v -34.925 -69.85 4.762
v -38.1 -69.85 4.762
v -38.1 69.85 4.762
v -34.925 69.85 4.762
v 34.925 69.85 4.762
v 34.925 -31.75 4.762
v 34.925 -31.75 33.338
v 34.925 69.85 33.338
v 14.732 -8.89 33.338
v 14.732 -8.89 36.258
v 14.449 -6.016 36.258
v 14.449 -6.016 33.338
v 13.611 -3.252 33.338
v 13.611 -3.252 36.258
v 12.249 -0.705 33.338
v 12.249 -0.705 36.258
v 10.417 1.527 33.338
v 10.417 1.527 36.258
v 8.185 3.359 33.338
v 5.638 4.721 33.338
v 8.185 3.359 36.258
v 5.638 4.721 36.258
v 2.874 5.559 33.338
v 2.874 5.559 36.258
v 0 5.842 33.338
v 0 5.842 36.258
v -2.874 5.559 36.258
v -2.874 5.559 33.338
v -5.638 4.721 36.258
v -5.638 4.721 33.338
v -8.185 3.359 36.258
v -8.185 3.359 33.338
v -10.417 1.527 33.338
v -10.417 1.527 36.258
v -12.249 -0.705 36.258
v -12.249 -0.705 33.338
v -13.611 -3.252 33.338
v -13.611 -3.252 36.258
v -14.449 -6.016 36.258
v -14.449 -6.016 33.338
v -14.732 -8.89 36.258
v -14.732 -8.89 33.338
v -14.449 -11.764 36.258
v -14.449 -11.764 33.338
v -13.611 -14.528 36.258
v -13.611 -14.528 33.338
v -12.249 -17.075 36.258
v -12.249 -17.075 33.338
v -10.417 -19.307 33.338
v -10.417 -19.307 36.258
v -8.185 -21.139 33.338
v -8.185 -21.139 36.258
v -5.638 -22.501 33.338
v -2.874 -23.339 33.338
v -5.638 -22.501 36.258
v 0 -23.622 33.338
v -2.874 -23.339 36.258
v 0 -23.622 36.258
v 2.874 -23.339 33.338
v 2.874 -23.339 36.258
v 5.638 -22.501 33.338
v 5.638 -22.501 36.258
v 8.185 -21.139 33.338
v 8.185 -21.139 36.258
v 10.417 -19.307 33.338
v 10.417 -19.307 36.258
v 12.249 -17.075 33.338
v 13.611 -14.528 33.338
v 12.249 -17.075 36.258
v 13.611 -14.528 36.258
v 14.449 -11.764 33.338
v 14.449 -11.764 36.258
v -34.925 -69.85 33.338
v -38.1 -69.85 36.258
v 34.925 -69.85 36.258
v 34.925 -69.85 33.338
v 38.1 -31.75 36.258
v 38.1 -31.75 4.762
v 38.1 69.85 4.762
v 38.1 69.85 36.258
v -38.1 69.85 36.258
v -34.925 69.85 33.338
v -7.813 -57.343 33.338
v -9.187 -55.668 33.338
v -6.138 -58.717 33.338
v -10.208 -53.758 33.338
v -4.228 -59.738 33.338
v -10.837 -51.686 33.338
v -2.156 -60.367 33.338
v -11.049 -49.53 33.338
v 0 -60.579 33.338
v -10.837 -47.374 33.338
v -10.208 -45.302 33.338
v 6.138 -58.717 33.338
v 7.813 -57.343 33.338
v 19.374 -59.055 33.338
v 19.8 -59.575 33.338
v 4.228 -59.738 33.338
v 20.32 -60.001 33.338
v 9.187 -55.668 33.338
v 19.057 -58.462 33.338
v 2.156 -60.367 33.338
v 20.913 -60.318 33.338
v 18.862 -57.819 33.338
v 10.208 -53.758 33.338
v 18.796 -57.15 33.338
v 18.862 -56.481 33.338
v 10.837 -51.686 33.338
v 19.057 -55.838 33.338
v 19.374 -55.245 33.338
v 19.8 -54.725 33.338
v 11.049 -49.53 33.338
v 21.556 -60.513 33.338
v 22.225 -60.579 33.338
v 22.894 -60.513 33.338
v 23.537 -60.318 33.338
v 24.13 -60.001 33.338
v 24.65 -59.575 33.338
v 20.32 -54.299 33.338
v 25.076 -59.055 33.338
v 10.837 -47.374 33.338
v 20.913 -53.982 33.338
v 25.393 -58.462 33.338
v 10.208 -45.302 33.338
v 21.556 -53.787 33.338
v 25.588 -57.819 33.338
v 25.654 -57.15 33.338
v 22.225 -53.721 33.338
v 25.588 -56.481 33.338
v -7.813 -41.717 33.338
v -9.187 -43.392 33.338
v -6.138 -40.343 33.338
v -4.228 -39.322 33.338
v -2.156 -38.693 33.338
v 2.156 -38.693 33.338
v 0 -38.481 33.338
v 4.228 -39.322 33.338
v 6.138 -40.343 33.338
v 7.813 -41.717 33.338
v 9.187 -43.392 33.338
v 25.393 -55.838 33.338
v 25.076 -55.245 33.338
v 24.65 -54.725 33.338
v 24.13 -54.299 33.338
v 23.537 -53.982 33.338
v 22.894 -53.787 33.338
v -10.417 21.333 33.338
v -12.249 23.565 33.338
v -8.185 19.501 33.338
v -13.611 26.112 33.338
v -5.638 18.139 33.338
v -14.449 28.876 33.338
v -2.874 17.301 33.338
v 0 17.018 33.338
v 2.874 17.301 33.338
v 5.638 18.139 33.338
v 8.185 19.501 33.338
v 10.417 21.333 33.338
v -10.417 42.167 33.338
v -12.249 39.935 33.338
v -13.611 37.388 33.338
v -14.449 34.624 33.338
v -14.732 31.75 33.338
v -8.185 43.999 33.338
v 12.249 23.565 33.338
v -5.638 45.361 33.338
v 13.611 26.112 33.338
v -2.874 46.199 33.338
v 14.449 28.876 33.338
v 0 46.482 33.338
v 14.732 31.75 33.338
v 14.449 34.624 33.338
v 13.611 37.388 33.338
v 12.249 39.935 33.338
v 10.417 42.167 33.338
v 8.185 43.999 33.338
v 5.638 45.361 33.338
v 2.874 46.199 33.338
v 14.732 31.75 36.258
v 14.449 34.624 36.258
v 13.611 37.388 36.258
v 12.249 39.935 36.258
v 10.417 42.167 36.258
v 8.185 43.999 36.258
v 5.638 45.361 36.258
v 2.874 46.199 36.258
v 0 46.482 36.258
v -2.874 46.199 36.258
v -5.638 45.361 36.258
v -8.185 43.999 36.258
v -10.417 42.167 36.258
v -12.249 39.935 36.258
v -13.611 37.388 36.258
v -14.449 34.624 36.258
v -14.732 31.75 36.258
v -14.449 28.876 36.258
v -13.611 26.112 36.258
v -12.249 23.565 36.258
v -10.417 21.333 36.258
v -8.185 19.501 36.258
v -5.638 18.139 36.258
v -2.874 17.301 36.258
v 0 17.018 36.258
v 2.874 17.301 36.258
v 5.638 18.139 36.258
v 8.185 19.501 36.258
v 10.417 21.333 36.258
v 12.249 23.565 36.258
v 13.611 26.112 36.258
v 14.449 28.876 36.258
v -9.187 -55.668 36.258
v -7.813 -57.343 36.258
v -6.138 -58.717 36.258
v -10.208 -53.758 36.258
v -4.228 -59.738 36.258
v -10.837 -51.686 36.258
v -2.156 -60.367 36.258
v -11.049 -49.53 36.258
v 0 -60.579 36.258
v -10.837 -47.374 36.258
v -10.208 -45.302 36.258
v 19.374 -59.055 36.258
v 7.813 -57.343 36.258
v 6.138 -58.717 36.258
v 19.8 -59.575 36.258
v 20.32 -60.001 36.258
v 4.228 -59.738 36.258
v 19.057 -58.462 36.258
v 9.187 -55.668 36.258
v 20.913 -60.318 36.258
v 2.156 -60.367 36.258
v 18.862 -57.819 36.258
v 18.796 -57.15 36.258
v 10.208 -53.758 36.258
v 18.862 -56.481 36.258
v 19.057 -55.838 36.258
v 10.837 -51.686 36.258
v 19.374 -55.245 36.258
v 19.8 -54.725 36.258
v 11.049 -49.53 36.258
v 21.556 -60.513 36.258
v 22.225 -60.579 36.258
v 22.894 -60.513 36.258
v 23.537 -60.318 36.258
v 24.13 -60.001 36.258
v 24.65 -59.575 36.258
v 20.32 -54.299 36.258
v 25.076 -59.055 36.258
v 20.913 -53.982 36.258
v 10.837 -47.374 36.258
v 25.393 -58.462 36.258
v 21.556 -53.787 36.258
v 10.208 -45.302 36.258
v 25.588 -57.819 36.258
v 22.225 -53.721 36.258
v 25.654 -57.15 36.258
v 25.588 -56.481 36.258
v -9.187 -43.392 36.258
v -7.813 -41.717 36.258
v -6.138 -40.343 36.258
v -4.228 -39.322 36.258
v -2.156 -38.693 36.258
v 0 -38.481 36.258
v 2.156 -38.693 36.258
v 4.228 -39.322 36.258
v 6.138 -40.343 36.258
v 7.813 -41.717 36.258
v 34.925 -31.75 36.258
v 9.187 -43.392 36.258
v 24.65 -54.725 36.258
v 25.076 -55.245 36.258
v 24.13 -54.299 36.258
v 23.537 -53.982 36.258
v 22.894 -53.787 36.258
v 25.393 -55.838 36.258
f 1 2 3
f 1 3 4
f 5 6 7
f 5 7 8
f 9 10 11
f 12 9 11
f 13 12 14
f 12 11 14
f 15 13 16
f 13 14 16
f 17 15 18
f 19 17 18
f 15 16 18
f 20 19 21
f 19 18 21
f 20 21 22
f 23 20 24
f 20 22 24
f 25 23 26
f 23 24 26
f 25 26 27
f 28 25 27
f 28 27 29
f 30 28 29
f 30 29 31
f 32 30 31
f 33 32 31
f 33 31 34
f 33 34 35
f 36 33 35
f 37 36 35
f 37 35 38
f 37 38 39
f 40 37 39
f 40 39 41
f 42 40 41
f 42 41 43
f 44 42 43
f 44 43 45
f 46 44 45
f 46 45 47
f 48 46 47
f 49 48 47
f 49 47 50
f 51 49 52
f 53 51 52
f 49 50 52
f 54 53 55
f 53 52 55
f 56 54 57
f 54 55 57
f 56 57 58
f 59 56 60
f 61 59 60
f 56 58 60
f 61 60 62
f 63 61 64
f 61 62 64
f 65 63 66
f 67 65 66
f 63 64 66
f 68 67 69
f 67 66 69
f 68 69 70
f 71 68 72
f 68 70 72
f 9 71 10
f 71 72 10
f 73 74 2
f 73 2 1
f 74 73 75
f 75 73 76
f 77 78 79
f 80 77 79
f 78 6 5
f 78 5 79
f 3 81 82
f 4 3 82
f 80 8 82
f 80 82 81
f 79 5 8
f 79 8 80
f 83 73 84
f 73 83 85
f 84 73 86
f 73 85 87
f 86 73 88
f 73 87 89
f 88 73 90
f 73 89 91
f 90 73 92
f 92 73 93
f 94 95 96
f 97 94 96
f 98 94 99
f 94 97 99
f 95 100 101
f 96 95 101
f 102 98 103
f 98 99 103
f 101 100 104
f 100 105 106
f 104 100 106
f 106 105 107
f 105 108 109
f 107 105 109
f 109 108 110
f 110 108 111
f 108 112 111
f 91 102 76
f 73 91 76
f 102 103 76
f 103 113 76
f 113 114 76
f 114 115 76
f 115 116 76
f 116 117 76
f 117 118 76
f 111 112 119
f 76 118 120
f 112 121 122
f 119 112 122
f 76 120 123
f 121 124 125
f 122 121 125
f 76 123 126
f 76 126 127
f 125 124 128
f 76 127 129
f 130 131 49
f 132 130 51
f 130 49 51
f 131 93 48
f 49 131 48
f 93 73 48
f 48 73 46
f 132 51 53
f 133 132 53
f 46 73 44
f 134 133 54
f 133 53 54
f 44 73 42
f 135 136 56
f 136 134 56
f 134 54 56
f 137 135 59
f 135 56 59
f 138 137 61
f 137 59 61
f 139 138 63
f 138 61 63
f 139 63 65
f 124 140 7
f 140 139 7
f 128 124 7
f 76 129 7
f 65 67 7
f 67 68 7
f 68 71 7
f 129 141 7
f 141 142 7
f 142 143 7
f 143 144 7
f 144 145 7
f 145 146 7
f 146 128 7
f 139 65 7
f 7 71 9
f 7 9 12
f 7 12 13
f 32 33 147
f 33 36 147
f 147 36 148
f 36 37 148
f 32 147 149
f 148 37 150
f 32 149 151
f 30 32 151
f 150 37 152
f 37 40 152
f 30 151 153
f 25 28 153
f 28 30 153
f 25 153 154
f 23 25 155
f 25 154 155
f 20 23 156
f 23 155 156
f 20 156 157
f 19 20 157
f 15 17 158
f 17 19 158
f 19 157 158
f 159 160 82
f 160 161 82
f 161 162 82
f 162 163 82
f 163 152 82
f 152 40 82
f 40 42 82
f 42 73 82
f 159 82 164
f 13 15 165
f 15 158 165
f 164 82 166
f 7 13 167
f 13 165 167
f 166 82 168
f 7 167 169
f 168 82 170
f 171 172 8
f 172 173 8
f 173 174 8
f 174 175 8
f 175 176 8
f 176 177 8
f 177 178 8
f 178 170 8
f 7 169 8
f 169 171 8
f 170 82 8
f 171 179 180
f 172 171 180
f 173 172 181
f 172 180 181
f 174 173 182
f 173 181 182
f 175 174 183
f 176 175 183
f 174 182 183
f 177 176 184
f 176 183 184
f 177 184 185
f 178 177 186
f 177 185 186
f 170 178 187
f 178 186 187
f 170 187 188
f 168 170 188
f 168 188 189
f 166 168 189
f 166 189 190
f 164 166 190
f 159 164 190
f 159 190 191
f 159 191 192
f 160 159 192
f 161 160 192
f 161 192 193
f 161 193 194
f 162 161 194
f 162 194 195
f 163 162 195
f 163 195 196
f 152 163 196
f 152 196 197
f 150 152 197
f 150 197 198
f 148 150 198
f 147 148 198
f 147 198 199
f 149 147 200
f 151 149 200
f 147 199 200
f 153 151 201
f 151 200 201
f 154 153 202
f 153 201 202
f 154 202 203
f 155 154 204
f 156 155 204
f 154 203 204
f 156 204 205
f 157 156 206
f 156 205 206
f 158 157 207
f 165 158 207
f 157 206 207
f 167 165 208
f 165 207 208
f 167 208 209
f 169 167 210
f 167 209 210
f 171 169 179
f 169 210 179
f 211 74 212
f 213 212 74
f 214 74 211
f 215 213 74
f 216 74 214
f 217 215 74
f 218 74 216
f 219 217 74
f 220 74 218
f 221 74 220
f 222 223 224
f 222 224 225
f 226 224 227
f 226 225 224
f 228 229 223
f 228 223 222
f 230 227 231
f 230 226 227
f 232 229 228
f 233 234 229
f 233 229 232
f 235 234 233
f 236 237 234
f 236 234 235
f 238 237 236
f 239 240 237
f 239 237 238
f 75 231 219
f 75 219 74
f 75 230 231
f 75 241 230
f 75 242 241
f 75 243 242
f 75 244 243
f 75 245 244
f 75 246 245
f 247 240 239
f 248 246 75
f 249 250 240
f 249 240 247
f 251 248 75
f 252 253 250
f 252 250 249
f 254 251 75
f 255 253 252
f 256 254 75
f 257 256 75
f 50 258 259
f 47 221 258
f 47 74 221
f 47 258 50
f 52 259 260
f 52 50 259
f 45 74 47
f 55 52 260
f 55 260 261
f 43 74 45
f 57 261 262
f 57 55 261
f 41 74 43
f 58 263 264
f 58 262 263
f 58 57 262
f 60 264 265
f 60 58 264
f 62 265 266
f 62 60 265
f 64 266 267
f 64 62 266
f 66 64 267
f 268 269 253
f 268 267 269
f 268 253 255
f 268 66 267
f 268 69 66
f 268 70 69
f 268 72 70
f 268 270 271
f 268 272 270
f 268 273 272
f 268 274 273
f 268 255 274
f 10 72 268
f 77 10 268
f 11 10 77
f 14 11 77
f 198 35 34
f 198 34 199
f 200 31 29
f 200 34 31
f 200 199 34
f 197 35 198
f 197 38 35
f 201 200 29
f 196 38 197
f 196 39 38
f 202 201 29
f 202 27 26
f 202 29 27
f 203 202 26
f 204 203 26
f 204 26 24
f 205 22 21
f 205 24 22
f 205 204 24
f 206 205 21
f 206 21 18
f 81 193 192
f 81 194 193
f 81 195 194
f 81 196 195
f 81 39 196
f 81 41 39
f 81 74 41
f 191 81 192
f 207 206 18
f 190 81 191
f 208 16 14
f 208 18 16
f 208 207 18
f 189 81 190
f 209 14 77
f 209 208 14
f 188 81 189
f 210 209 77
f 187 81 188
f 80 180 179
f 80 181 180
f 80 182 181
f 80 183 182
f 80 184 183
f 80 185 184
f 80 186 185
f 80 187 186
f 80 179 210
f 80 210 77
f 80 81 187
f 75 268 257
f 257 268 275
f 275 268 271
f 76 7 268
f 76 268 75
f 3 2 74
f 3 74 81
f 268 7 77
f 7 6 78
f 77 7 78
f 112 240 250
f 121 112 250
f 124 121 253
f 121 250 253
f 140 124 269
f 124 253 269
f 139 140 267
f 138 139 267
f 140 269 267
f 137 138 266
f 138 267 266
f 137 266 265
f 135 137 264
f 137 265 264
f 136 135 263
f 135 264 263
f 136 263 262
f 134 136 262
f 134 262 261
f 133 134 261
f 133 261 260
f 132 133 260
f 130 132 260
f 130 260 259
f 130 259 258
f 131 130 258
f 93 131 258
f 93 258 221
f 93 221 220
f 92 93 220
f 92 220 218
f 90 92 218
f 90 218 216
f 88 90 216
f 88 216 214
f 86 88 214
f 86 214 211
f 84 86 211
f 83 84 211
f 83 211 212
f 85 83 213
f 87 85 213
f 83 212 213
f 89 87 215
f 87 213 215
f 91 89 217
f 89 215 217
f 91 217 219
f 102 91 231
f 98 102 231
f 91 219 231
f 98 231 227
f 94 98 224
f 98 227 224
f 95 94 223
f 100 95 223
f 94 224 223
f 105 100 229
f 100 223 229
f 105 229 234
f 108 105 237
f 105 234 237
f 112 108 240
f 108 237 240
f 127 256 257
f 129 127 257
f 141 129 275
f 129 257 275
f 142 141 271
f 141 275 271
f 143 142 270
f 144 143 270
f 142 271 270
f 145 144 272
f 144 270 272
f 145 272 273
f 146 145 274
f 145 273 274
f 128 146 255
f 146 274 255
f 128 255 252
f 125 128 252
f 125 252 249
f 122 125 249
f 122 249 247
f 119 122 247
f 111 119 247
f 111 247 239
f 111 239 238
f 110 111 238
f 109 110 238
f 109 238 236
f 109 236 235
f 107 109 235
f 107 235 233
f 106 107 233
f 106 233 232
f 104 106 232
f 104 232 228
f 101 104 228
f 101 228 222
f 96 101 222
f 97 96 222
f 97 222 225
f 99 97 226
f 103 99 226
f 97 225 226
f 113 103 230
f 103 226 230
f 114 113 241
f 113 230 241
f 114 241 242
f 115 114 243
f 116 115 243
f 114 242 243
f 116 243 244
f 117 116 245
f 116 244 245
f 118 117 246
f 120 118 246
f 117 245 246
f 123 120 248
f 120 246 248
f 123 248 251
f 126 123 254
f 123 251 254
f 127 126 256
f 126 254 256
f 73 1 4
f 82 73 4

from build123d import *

# Parameters (mm, degrees)
F0_W      = 76.2
F0_H      = 139.7
F1_DEPTH  = 4.7625
F2_W      = 3.175
F2_H      = 139.7
F3_DEPTH  = 28.575
F4_W      = 76.2
F4_H      = 139.7
F5_DEPTH  = 2.921
F6_R      = 11.684
F6_R_2    = 11.049
F7_DEPTH  = 76.2
F6_R_3    = 14.732
F8_DEPTH  = 25.4
F9_R      = 11.43
F10_DEPTH = 25.4
F11_W     = 76.2
F11_H     = 139.7
F12_DEPTH = 4.7625
F13_R     = 14.732
F14_DEPTH = 25.4
F15_W     = 3.175
F15_H     = 38.1
F16_DEPTH = 49.04312
F17_R     = 3.429
F18_DEPTH = 25.4


with BuildPart() as f1:
    # F0 (on Top) → F1 (new body)
    with BuildSketch(Plane.XY):
        Rectangle(F0_W, F0_H)
    extrude(amount=F1_DEPTH)

    # F2 (on face) → F3 (join)
    with BuildSketch(Plane.XY.offset(4.7625)):
        with Locations((-36.5125, 0)):
            Rectangle(F2_W, F2_H)
        with Locations((36.5125, 0)):
            Rectangle(F2_W, F2_H)
    extrude(amount=F3_DEPTH)

    # F4 (on face) → F5 (join)
    with BuildSketch(Plane.XY.offset(33.3375)):
        Rectangle(F4_W, F4_H)
    extrude(amount=F5_DEPTH)

    # F6 (on face) → F7 (cut)
    with BuildSketch(Plane.XY.offset(36.2585)):
        with Locations((0, -8.89)):
            Circle(F6_R)
        with Locations((0, -49.53)):
            Circle(F6_R_2)
    extrude(amount=-F7_DEPTH, mode=Mode.SUBTRACT)

    # F6 (on face) → F8 (cut)
    with BuildSketch(Plane.XY.offset(36.2585)):
        with Locations((0, 31.75)):
            Circle(F6_R_3)
    extrude(amount=-F8_DEPTH, mode=Mode.SUBTRACT)

    # F9 (on face) → F10 (cut)
    with BuildSketch(Plane(origin=(0, 0, 0), x_dir=(1, 0, 0), z_dir=(0, 0, -1))):
        with Locations((0, -34.29)):
            Circle(F9_R)
    extrude(amount=-F10_DEPTH, mode=Mode.SUBTRACT)

    # F11 (on face) → F12 (cut)
    with BuildSketch(Plane(origin=(0, 0, 0), x_dir=(1, 0, 0), z_dir=(0, 0, -1))):
        Rectangle(F11_W, F11_H)
    extrude(amount=-F12_DEPTH, mode=Mode.SUBTRACT)

    # F13 (on face) → F14 (cut)
    with BuildSketch(Plane.XY.offset(36.2585)):
        with Locations((0, -8.89)):
            Circle(F13_R)
    extrude(amount=-F14_DEPTH, mode=Mode.SUBTRACT)

    # F15 (on face) → F16 (cut)
    with BuildSketch(Plane(origin=(0, 0, 4.7625), x_dir=(1, 0, 0), z_dir=(0, 0, -1))):
        with Locations((36.5125, 50.8)):
            Rectangle(F15_W, F15_H)
    extrude(amount=-F16_DEPTH, mode=Mode.SUBTRACT)

    # F17 (on face) → F18 (cut)
    with BuildSketch(Plane.XY.offset(36.2585)):
        with Locations((22.225, -57.15)):
            Circle(F17_R)
    extrude(amount=-F18_DEPTH, mode=Mode.SUBTRACT)


solid = f1.part
